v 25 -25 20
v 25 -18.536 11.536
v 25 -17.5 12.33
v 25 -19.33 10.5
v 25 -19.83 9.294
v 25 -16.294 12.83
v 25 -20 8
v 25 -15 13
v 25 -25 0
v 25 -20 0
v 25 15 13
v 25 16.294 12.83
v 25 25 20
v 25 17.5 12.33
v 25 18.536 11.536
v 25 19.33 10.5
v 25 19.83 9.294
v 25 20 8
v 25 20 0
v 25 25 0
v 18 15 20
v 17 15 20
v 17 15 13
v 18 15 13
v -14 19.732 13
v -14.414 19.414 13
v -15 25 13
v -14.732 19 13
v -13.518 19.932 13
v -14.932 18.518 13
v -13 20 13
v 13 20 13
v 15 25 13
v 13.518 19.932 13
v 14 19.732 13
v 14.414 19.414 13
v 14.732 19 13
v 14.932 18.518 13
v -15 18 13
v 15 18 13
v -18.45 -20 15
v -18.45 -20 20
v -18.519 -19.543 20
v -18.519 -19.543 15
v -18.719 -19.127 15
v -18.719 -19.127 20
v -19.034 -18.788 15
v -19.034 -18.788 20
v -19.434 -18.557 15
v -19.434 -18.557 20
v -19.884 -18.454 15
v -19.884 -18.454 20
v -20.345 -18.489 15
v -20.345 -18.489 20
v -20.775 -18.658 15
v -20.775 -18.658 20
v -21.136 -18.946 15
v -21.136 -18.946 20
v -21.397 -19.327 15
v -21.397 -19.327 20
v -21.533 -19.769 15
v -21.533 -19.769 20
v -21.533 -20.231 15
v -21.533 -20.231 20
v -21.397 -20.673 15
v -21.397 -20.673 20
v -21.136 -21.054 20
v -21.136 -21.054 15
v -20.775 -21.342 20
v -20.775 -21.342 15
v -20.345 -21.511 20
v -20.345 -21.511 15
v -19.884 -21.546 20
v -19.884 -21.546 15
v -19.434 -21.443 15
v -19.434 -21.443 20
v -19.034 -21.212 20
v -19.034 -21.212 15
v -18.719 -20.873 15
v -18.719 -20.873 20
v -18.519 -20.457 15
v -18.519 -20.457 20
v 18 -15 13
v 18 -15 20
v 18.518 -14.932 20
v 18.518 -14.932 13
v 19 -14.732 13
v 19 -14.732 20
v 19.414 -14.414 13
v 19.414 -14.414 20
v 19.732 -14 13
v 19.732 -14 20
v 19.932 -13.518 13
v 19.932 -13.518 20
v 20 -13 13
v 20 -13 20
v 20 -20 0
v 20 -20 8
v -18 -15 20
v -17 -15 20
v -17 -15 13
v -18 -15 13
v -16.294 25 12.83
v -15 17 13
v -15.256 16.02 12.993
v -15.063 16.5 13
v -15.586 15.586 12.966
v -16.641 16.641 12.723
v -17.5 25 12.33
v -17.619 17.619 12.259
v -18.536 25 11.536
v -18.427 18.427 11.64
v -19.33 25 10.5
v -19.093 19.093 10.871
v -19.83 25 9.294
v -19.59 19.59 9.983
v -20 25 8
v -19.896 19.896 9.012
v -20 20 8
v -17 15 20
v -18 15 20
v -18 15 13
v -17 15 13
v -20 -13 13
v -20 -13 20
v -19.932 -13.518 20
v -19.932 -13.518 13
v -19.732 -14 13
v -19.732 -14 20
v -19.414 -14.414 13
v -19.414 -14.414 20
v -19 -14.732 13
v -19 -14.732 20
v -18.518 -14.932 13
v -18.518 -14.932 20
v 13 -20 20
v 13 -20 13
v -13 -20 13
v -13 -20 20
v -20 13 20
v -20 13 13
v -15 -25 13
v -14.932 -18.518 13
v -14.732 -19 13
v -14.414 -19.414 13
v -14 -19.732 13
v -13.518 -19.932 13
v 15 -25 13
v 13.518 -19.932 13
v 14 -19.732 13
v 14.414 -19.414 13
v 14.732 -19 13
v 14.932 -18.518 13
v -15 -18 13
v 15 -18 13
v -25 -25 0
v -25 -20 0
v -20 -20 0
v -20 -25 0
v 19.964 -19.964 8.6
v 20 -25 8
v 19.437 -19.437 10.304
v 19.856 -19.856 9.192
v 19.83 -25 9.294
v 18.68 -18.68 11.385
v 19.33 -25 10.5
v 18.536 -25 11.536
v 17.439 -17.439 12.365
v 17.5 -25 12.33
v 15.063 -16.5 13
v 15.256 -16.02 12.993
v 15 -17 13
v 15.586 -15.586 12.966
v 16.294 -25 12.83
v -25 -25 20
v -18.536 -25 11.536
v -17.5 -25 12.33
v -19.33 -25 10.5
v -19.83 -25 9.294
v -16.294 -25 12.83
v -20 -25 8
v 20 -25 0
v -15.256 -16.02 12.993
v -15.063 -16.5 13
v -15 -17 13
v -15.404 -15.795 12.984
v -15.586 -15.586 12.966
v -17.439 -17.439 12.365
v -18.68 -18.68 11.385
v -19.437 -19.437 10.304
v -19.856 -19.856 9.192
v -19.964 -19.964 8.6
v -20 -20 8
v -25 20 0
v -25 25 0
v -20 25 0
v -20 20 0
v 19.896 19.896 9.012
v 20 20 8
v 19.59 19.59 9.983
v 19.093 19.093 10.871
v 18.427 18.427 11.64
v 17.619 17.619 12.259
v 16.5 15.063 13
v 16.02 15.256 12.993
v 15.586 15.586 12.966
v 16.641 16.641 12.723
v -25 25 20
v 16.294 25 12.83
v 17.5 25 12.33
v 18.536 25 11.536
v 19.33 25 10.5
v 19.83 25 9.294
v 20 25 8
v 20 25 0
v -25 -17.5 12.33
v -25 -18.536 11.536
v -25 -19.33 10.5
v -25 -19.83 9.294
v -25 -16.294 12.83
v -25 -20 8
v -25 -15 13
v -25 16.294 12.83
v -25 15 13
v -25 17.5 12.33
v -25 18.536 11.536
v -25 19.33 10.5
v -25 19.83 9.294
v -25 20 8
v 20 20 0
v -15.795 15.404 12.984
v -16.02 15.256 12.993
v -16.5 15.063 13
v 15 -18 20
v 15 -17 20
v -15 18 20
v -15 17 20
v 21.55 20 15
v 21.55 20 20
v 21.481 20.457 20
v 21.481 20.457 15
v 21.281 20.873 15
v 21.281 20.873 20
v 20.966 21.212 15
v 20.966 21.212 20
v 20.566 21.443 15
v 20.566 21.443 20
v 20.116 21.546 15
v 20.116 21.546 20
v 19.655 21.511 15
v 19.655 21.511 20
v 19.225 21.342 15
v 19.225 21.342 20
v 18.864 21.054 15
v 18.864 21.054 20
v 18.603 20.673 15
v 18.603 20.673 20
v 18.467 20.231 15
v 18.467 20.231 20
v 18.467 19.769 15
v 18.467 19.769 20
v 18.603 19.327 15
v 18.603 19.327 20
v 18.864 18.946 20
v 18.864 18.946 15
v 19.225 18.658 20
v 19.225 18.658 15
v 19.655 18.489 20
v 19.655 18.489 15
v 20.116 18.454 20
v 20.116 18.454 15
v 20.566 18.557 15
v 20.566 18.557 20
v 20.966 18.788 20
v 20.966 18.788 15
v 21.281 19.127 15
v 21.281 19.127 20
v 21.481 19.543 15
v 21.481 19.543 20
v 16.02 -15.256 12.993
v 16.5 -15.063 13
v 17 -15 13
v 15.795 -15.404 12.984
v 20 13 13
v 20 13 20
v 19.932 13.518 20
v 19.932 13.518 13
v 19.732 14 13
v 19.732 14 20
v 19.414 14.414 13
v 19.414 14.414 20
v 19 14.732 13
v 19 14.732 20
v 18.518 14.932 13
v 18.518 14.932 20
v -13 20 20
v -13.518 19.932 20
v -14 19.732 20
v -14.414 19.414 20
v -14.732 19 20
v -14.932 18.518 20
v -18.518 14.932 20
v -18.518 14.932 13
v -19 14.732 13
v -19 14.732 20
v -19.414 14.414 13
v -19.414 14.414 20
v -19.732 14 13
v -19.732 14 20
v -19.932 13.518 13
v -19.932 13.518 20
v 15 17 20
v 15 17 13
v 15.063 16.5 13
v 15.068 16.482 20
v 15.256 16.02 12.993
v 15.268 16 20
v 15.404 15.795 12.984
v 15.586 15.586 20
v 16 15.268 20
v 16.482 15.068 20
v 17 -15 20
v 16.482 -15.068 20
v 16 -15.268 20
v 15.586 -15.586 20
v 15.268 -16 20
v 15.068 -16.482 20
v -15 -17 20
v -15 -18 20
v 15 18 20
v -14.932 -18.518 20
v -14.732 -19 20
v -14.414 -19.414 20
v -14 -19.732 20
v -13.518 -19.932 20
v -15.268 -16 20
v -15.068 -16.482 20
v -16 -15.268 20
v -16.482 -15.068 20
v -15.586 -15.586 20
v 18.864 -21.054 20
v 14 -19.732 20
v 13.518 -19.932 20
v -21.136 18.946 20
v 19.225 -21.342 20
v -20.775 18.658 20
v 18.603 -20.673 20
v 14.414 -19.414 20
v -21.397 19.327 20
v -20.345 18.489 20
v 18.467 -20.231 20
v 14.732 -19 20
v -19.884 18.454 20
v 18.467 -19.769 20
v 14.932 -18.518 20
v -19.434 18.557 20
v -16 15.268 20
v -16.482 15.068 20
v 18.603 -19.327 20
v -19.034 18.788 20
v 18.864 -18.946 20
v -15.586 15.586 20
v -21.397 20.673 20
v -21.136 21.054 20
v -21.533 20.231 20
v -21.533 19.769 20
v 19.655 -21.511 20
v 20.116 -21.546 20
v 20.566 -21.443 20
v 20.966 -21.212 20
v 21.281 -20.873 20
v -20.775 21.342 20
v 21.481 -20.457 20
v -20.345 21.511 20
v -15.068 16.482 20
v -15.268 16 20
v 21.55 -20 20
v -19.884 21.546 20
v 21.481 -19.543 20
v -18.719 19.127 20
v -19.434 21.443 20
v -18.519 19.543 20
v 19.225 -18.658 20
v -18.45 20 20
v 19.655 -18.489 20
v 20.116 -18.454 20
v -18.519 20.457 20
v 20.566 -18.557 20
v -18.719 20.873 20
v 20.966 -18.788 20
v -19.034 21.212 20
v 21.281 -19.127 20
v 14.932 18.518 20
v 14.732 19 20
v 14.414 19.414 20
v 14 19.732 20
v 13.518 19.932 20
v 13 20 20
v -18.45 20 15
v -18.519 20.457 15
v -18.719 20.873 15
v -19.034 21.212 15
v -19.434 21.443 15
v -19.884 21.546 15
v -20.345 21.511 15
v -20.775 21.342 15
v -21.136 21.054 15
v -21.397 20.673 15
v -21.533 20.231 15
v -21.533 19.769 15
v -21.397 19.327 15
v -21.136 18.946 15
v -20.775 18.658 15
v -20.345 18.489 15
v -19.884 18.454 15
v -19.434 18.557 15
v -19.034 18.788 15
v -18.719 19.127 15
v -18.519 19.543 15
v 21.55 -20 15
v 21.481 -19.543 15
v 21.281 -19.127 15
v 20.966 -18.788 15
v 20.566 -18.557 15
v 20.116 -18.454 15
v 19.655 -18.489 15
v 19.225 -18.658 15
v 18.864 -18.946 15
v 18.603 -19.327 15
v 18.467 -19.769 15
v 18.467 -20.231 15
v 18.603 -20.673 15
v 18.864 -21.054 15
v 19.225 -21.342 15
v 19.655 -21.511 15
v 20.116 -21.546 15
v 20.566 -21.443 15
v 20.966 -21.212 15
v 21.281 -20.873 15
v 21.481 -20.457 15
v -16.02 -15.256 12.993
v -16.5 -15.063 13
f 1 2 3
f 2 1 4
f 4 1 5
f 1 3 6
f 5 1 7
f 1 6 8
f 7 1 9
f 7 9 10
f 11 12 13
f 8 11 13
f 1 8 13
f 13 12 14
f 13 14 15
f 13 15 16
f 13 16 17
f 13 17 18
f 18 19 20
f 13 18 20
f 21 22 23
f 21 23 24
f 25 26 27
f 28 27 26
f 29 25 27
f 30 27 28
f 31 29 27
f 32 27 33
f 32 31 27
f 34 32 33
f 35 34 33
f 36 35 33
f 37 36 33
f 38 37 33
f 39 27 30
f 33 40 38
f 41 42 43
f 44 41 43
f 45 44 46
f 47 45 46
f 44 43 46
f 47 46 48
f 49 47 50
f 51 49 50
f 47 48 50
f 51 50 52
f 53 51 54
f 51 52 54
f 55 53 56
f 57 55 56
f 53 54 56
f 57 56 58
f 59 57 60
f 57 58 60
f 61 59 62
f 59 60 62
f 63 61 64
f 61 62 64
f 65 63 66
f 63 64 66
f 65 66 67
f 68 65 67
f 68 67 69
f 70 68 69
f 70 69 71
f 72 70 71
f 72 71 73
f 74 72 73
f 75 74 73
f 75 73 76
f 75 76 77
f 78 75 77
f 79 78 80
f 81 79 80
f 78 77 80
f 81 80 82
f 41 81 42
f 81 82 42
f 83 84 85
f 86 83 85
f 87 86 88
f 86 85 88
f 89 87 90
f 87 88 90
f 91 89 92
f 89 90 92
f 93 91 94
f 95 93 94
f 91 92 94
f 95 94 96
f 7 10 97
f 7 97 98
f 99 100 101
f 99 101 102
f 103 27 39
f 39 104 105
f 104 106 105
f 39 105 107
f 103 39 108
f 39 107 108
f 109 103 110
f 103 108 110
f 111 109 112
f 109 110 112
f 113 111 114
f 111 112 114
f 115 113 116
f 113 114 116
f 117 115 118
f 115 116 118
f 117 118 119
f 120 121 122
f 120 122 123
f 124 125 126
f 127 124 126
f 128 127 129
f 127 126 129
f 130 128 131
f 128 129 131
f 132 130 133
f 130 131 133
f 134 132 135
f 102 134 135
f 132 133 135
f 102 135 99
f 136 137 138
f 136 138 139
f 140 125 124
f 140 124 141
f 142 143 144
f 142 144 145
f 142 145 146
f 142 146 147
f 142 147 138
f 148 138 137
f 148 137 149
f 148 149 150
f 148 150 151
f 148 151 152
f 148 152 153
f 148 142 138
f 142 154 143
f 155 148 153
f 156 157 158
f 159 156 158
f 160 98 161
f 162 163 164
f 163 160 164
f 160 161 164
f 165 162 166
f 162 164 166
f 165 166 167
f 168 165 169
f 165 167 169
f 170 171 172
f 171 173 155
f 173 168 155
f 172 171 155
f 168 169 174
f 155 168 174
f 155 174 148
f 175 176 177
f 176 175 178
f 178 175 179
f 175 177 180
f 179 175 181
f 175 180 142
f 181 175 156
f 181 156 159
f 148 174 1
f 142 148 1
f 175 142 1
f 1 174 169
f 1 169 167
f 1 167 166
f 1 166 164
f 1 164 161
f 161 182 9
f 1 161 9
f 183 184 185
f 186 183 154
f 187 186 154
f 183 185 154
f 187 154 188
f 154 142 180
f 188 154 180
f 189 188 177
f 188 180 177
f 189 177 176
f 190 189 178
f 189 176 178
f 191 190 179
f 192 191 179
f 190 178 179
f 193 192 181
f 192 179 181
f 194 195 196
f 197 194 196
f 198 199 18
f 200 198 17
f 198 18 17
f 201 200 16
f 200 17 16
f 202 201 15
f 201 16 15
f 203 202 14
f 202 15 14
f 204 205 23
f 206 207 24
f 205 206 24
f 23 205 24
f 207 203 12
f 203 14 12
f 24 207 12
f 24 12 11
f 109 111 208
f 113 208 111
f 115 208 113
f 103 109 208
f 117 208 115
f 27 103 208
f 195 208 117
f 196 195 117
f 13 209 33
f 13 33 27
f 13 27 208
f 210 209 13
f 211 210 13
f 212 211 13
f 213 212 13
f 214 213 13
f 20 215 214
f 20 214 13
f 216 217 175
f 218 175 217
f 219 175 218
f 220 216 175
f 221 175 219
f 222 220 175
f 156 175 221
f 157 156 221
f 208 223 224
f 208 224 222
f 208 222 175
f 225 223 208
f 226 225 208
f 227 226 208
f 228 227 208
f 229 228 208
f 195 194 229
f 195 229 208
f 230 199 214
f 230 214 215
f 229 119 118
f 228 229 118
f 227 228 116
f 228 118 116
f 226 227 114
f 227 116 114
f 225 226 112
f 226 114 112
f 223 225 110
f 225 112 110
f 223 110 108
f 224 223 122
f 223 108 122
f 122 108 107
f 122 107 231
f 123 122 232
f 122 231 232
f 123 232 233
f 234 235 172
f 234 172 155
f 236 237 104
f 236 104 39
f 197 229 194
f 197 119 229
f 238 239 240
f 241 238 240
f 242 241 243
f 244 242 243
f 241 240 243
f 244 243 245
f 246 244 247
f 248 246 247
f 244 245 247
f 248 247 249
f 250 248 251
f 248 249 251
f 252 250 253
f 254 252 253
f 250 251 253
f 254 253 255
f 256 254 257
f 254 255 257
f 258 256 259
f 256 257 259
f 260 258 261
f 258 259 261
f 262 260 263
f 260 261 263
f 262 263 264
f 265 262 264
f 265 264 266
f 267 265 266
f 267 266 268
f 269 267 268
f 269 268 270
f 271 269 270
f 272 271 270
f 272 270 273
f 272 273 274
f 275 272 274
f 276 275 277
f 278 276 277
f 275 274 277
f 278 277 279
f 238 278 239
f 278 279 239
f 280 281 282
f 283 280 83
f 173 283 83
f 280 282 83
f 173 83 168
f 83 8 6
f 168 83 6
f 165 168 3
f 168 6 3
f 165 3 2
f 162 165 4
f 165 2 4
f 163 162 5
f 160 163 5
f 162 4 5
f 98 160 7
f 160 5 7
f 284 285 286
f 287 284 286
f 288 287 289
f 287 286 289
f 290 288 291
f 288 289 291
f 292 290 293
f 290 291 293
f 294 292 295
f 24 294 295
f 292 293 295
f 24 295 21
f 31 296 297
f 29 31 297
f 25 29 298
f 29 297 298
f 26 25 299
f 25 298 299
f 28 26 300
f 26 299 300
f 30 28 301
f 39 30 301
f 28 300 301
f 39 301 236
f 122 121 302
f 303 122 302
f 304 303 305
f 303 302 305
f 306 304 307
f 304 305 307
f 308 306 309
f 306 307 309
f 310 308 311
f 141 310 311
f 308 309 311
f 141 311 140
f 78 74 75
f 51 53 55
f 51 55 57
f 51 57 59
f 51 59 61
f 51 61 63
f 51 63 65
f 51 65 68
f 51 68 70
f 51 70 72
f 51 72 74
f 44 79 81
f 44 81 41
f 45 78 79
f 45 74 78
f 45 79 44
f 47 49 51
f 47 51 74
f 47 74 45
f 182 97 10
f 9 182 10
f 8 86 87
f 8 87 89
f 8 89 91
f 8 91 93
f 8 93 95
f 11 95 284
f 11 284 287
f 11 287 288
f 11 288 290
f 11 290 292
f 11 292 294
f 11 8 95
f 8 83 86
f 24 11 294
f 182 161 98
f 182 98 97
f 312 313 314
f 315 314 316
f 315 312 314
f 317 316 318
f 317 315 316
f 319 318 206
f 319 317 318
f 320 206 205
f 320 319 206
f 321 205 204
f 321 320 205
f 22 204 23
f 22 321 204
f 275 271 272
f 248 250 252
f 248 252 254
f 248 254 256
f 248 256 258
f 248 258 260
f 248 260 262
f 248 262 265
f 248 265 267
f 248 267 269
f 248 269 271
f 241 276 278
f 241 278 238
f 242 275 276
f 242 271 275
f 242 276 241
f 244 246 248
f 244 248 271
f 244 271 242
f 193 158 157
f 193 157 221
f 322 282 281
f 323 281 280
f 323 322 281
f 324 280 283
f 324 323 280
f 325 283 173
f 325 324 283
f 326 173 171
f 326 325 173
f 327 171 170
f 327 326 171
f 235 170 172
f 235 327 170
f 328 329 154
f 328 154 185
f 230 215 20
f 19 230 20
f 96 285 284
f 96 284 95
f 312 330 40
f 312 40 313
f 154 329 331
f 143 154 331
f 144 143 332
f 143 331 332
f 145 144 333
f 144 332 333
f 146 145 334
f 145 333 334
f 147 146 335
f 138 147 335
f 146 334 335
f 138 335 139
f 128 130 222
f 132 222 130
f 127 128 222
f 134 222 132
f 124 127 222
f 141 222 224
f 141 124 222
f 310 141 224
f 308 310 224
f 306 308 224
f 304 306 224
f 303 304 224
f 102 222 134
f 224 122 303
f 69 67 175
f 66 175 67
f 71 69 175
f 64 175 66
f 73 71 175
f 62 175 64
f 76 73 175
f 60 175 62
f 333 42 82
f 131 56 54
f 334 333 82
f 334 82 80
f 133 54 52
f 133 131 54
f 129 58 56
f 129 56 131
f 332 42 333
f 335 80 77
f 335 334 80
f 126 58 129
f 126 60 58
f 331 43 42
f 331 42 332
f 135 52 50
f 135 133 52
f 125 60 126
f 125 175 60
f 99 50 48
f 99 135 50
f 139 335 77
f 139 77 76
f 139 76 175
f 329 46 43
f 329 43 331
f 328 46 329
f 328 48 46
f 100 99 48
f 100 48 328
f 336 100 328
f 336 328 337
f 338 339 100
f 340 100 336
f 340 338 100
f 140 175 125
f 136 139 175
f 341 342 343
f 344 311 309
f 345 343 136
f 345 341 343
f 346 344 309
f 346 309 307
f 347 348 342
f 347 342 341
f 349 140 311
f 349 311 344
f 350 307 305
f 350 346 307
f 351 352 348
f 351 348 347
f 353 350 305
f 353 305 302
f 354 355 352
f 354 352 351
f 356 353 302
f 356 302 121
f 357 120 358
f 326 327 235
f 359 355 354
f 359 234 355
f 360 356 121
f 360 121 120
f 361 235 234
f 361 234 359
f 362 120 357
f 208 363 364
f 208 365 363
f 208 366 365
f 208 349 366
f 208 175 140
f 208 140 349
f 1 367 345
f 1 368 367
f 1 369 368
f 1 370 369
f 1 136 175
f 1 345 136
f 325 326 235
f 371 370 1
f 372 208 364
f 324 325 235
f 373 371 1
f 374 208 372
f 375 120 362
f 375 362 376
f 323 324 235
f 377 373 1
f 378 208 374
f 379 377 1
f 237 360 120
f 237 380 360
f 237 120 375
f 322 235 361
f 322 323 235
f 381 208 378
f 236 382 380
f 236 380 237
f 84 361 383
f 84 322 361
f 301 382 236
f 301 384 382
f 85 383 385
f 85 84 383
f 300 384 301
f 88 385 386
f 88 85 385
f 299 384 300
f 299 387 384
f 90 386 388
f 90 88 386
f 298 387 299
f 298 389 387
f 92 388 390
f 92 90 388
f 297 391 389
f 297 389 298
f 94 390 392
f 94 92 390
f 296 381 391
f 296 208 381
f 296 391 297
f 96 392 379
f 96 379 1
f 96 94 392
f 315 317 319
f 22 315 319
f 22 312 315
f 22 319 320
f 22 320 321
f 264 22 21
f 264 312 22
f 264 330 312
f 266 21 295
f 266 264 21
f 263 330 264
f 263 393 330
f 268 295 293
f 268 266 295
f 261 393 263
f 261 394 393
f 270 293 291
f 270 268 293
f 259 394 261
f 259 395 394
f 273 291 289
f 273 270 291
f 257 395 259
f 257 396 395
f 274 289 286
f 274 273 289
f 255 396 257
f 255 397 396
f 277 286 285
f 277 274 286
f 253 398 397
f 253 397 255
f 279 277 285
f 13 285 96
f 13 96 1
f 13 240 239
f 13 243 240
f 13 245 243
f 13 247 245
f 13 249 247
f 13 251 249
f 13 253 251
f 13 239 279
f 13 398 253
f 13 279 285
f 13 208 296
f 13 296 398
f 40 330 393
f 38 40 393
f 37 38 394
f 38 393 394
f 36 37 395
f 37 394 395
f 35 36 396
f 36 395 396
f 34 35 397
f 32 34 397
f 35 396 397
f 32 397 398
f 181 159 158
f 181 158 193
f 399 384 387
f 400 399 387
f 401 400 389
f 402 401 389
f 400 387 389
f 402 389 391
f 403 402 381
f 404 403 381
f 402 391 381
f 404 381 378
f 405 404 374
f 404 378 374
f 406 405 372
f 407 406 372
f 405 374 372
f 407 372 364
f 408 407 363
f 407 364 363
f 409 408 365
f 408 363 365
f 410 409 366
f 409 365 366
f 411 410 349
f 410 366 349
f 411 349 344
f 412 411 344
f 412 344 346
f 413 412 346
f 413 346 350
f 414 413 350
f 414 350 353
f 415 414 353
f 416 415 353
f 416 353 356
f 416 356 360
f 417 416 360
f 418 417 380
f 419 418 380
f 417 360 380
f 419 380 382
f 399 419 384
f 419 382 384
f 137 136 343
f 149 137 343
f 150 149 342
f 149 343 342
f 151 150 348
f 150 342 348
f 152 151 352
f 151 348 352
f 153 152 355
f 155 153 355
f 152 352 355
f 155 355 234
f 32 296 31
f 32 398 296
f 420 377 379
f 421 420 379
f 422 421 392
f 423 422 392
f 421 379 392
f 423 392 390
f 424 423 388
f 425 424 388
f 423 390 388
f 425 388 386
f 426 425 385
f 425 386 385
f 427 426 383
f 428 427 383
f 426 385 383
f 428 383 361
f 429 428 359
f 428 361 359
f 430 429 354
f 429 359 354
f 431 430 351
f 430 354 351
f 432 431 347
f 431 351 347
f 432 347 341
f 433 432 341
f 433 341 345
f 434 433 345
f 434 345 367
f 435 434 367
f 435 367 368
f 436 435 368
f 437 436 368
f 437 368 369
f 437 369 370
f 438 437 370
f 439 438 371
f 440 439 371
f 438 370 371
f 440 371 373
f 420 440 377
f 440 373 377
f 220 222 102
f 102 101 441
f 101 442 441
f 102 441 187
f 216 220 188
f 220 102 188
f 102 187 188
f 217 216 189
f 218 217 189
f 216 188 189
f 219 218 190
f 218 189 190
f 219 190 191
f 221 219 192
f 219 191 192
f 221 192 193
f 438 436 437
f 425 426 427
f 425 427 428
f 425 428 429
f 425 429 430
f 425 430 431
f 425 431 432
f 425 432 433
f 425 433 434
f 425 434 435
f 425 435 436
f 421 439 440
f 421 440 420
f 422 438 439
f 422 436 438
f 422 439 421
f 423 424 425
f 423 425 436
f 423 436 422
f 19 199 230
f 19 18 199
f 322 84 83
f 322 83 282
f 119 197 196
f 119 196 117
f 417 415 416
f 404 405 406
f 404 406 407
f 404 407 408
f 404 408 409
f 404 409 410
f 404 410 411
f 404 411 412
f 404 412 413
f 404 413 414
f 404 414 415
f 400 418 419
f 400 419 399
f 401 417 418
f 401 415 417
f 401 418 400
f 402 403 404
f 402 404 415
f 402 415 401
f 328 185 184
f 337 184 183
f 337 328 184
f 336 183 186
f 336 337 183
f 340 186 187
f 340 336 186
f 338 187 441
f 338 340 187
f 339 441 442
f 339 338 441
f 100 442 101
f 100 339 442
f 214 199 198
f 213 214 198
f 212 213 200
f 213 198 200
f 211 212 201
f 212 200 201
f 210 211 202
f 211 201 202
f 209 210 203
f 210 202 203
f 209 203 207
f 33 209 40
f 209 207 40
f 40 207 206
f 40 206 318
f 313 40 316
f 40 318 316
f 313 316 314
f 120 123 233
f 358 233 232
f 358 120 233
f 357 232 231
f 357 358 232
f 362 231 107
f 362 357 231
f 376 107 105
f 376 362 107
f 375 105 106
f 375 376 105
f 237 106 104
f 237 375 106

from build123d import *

# Parameters (mm, degrees)
SKETCH_W        = 50
SKETCH_H        = 50
PAD_DEPTH       = 20
POCKET_DEPTH    = 20.001
POCKET001_DEPTH = 50.001
POCKET002_DEPTH = 50.001
SKETCH009_R     = 1.55
POCKET008_DEPTH = 5


with BuildPart() as part:
    # Sketch → Pad (new body)
    with BuildSketch(Plane.XY):
        Rectangle(SKETCH_W, SKETCH_H)
    extrude(amount=PAD_DEPTH)

    # Sketch001 (on Face6 of Pad) → Pocket (cut, through all)
    with BuildSketch(Plane.XY.offset(20)):
        with BuildLine():
            Line((-18, 15), (-17, 15))
            ThreePointArc((-17, 15), (-15.585786, 15.585786), (-15, 17))
            Line((-15, 17), (-15, 18))
            ThreePointArc((-13, 20), (-14.414214, 19.414214), (-15, 18))
            Line((-13, 20), (13, 20))
            ThreePointArc((15, 18), (14.414214, 19.414214), (13, 20))
            Line((15, 18), (15, 17))
            ThreePointArc((15, 17), (15.585786, 15.585786), (17, 15))
            Line((17, 15), (18, 15))
            ThreePointArc((20, 13), (19.414214, 14.414214), (18, 15))
            Line((20, 13), (20, -13))
            ThreePointArc((18, -15), (19.414214, -14.414214), (20, -13))
            Line((18, -15), (17, -15))
            ThreePointArc((17, -15), (15.585786, -15.585786), (15, -17))
            Line((15, -17), (15, -18))
            ThreePointArc((13, -20), (14.414214, -19.414214), (15, -18))
            Line((13, -20), (-13, -20))
            ThreePointArc((-15, -18), (-14.414214, -19.414214), (-13, -20))
            Line((-15, -18), (-15, -17))
            ThreePointArc((-15, -17), (-15.585786, -15.585786), (-17, -15))
            Line((-17, -15), (-18, -15))
            ThreePointArc((-20, -13), (-19.414214, -14.414214), (-18, -15))
            Line((-20, -13), (-20, 13))
            ThreePointArc((-18, 15), (-19.414214, 14.414214), (-20, 13))
        make_face()
    extrude(amount=-POCKET_DEPTH, mode=Mode.SUBTRACT)

    # Sketch002 (on Face3 of Pocket) → Pocket001 (cut, through all)
    with BuildSketch(Plane.YZ.offset(25)):
        with BuildLine():
            Line((-15, 13), (15, 13))
            ThreePointArc((20, 8), (18.535534, 11.535534), (15, 13))
            Line((20, 8), (20, 0))
            Line((20, 0), (-20, 0))
            Line((-20, 0), (-20, 8))
            ThreePointArc((-15, 13), (-18.535534, 11.535534), (-20, 8))
        make_face()
    extrude(amount=-POCKET001_DEPTH, mode=Mode.SUBTRACT)

    # Sketch003 (on Face6 of Pocket) → Pocket002 (cut, through all)
    with BuildSketch(Plane.XZ.offset(25)):
        with BuildLine():
            Line((-15, 13), (15, 13))
            ThreePointArc((20, 8), (18.535534, 11.535534), (15, 13))
            Line((20, 8), (20, 0))
            Line((20, 0), (-20, 0))
            Line((-20, 0), (-20, 8))
            ThreePointArc((-15, 13), (-18.535534, 11.535534), (-20, 8))
        make_face()
    extrude(amount=-POCKET002_DEPTH, mode=Mode.SUBTRACT)

    # Sketch009 → Pocket008 (cut)
    with BuildSketch(Plane.XY.offset(20)):
        with Locations((-20, 20)):
            Circle(SKETCH009_R)
        with Locations((20, 20)):
            Circle(SKETCH009_R)
        with Locations((20, -20)):
            Circle(SKETCH009_R)
        with Locations((-20, -20)):
            Circle(SKETCH009_R)
    extrude(amount=-POCKET008_DEPTH, mode=Mode.SUBTRACT)


solid = part.part
